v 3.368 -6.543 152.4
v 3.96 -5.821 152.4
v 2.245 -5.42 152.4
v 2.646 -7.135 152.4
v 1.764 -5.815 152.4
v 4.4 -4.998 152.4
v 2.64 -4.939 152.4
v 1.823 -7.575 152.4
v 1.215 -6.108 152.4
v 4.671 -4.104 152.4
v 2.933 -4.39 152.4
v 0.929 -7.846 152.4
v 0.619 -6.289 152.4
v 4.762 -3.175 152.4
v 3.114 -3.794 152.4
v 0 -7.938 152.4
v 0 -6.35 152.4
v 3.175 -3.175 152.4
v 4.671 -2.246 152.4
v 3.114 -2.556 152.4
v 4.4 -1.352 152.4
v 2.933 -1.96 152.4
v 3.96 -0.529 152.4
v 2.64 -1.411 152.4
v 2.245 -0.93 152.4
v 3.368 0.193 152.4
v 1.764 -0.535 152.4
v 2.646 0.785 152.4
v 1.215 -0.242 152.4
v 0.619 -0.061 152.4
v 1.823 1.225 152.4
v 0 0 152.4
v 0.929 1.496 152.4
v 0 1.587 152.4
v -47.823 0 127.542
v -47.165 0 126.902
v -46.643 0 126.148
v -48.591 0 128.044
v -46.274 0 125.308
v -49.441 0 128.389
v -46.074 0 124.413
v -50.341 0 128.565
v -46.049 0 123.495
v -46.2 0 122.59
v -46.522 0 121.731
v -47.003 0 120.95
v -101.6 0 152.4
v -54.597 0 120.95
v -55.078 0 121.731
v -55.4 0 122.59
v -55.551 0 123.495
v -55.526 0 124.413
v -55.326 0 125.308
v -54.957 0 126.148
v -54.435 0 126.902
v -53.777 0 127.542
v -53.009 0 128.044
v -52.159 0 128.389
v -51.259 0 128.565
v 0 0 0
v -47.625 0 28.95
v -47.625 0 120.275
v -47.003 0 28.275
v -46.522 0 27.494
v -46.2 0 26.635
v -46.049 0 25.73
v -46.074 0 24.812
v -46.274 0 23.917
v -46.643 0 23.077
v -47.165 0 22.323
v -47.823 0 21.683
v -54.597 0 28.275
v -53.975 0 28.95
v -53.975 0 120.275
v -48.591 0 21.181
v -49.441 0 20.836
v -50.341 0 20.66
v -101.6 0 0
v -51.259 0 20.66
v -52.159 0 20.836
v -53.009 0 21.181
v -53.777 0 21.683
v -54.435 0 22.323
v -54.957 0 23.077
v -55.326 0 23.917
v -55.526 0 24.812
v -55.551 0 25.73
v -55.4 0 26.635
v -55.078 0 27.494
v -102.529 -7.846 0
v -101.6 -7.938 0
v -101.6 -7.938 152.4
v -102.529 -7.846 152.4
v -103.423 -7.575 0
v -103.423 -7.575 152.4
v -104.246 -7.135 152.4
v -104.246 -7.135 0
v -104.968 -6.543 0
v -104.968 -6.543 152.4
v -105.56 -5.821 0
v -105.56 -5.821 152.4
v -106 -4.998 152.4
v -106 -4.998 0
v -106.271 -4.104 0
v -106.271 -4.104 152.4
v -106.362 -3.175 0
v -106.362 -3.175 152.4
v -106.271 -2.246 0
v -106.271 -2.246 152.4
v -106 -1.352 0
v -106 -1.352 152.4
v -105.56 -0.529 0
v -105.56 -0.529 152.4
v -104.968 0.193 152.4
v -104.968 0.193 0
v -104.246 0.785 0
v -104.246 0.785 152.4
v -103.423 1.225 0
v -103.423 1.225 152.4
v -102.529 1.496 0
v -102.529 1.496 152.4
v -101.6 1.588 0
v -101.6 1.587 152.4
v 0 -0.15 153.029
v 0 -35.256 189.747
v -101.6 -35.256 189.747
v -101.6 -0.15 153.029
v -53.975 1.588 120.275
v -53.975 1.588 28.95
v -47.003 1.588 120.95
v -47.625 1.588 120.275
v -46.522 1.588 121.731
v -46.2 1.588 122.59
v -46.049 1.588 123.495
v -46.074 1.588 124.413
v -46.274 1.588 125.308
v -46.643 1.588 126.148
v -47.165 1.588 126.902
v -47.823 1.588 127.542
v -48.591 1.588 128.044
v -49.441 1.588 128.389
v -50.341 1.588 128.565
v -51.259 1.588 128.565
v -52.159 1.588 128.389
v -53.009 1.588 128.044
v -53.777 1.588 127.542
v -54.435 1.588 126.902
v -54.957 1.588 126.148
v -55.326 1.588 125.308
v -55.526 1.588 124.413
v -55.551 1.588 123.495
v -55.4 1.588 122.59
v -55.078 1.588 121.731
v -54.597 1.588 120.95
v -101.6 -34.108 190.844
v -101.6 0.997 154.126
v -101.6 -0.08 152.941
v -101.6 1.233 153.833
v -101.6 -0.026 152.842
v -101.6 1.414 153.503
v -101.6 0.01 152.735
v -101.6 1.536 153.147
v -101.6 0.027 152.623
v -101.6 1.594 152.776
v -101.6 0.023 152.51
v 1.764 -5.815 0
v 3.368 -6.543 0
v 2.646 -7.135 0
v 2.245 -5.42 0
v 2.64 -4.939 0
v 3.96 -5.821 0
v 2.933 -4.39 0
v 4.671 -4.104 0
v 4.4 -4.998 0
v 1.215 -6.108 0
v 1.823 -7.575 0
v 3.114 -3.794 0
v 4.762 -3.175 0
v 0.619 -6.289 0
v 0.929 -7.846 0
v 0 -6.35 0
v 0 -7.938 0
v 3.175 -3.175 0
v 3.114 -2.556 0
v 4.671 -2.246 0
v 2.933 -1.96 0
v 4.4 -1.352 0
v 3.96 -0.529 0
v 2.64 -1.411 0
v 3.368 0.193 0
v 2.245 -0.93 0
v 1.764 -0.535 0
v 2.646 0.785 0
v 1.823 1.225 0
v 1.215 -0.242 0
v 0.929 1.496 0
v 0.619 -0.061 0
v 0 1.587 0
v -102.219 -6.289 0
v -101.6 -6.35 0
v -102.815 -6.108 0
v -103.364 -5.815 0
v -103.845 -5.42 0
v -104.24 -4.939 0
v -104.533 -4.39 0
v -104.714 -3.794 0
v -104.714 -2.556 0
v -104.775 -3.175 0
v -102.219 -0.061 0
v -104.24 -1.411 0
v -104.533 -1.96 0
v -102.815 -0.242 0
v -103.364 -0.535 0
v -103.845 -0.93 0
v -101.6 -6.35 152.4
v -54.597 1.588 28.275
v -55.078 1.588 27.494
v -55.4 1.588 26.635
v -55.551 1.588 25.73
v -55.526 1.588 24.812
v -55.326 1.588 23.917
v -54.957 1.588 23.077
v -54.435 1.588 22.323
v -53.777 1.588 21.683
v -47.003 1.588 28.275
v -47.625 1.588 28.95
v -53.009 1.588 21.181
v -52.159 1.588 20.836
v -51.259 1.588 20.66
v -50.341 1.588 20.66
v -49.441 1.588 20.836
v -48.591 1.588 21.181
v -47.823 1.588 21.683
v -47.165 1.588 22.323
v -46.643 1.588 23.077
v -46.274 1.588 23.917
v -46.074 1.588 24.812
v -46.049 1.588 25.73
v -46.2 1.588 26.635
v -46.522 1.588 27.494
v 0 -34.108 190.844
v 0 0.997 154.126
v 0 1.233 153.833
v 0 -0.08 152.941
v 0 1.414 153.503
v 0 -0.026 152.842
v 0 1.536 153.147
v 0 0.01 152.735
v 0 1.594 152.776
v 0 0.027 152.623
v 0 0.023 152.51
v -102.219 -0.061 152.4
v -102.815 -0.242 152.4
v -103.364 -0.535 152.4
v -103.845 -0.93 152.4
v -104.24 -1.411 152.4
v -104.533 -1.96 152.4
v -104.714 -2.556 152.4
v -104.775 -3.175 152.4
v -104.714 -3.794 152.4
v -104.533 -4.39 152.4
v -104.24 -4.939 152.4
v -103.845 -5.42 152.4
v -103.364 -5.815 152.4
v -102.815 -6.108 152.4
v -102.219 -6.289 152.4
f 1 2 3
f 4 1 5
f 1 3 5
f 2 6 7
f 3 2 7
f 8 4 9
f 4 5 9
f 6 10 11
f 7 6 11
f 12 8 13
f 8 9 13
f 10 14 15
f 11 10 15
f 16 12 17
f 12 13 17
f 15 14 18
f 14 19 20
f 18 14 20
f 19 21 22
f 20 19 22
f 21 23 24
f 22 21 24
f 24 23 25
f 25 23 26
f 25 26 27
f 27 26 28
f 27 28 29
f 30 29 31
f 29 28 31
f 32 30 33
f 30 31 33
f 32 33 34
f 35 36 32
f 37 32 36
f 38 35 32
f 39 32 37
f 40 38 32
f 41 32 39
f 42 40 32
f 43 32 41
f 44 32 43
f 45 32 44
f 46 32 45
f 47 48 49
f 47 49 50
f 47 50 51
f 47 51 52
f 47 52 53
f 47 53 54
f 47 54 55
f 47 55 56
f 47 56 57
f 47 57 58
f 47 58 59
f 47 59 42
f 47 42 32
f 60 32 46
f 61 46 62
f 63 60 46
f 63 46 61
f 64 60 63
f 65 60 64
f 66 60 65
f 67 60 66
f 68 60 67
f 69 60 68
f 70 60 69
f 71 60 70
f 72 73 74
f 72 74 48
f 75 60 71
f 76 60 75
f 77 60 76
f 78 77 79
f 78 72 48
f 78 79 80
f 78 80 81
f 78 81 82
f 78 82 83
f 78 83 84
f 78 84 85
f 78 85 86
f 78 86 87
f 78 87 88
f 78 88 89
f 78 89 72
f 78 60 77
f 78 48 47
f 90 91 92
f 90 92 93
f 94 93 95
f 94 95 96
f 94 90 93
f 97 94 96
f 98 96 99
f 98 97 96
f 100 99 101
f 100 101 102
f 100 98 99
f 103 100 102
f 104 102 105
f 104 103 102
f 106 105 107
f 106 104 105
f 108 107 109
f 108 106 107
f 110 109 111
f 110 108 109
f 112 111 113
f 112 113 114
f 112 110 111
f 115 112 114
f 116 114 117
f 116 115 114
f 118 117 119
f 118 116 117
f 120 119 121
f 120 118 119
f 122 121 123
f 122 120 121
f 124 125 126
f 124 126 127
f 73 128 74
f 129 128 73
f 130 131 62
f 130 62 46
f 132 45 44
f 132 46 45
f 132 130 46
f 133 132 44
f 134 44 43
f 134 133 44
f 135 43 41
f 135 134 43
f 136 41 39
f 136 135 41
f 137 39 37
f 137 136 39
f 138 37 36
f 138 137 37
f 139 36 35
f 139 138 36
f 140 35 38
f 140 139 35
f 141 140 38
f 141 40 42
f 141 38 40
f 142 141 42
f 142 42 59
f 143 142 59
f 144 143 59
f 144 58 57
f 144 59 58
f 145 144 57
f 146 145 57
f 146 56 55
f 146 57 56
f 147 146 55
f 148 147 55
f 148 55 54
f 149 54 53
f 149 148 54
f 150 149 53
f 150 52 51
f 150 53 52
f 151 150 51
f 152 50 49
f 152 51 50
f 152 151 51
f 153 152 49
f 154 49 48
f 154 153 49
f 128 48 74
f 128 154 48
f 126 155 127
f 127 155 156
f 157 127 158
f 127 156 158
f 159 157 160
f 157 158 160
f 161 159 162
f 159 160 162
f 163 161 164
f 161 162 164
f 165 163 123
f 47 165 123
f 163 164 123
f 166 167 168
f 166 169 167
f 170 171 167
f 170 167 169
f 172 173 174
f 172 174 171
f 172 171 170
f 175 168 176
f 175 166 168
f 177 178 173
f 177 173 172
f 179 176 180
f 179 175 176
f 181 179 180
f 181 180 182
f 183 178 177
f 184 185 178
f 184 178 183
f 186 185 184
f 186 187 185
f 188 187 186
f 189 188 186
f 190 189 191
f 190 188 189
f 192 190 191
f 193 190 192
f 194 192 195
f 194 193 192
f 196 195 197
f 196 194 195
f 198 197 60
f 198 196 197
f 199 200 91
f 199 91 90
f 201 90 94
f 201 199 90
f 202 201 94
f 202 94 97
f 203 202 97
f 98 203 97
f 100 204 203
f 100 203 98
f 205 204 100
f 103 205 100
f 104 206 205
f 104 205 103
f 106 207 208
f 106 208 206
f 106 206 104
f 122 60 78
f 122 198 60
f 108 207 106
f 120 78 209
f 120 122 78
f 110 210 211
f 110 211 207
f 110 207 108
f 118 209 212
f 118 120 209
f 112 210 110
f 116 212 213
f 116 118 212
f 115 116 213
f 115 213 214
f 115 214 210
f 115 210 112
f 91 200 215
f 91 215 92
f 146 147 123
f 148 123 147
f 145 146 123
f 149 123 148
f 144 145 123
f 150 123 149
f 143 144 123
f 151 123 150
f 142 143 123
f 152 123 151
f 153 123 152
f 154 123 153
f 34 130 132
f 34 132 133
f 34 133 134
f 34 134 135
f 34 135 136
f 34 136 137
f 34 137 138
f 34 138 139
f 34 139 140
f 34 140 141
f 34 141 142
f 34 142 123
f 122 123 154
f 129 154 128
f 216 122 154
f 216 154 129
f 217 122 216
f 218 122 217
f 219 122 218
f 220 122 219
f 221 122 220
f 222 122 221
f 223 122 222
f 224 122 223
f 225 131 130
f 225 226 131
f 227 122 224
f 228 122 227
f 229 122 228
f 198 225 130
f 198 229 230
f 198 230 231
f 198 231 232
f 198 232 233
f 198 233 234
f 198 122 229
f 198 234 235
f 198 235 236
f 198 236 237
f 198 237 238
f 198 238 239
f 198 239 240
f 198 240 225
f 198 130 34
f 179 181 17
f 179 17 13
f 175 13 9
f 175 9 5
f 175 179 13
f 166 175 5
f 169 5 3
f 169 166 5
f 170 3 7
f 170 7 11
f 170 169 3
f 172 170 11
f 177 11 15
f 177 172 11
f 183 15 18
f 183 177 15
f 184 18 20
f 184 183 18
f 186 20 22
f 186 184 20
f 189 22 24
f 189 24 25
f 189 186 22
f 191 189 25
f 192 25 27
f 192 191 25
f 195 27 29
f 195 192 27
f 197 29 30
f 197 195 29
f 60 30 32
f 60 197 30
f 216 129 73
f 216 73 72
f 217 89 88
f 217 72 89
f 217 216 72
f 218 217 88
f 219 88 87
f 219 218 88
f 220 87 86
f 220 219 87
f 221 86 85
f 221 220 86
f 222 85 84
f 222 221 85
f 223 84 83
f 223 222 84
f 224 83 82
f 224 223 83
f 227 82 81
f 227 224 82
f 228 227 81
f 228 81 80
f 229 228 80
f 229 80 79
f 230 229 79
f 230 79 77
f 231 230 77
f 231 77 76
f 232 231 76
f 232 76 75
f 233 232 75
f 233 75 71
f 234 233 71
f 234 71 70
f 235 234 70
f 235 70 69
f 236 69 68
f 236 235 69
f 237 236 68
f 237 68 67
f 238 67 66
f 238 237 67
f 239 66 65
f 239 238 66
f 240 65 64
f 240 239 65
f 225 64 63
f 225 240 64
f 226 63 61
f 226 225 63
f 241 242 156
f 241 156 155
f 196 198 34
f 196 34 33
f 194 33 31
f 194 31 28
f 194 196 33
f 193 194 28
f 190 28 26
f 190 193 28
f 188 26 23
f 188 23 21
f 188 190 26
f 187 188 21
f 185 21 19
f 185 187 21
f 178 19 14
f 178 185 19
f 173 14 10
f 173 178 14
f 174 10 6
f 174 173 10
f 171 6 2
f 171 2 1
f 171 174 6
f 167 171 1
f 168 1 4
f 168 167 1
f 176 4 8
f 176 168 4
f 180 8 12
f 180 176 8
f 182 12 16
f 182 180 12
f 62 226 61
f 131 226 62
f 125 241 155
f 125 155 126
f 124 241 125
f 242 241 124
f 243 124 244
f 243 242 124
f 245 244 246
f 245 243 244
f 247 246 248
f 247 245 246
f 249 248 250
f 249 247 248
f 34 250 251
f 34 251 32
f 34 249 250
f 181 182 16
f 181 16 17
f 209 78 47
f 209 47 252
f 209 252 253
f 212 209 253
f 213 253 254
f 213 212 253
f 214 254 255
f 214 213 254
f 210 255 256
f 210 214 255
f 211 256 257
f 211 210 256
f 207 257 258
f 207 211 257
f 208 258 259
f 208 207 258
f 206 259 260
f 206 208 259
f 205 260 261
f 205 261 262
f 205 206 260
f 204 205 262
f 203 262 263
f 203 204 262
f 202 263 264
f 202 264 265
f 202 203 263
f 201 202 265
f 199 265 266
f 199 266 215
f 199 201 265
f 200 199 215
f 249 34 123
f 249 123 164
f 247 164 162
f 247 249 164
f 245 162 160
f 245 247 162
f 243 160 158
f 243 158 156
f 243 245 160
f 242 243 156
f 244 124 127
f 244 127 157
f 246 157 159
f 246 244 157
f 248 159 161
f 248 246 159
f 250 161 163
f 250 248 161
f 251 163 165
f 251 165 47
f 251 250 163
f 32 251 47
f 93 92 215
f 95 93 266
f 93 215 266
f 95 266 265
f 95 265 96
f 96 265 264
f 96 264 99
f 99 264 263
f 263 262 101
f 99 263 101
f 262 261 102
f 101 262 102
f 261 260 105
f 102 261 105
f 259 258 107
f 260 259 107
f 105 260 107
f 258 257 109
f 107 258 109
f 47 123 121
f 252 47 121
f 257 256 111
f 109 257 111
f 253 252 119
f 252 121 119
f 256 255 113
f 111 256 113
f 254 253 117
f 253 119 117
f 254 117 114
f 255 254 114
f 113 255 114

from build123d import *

# Parameters (mm, degrees)
EXTRUDE_THIN1_DEPTH = 152.4
CUT_EXTRUDE1_DEPTH  = 187.089943391
BOSS_EXTRUDE1_DEPTH = 101.6


with BuildPart() as part:
    # Sketch1 → Extrude-Thin1 (new body)
    with BuildSketch(Plane.XY):
        with BuildLine():
            ThreePointArc((0, -6.35), (3.175, -3.175), (0, 0))
            Line((0, 0), (-101.6, 0))
            ThreePointArc((-101.6, 0), (-104.775, -3.175), (-101.6, -6.35))
            Line((-101.6, -6.35), (-101.6, -7.9375))
            ThreePointArc((-101.6, -7.9375), (-106.3625, -3.175), (-101.6, 1.5875))
            Line((-101.6, 1.5875), (0, 1.5875))
            ThreePointArc((0, 1.5875), (4.7625, -3.175), (0, -7.9375))
            Line((0, -7.9375), (0, -6.35))
        make_face()
    extrude(amount=EXTRUDE_THIN1_DEPTH)

    # Sketch3 → Cut-Extrude1 (cut, through all)
    with BuildSketch(Plane(origin=(0, 1.5875, 0), x_dir=(1, 0, 0), z_dir=(0, 1, 0))):
        with BuildLine():
            Line((-53.975, -120.275242086), (-53.975, -28.949757914))
            ThreePointArc((-53.975, -28.949757914), (-50.8, -20.6375), (-47.625, -28.949757914))
            Line((-47.625, -28.949757914), (-47.625, -120.275242086))
            ThreePointArc((-47.625, -120.275242086), (-50.8, -128.5875), (-53.975, -120.275242086))
        make_face()
    extrude(amount=-CUT_EXTRUDE1_DEPTH, mode=Mode.SUBTRACT)

    # Sketch4 → Boss-Extrude1 (add)
    with BuildSketch(Plane(origin=(0, 0, 0), x_dir=(0, 0, -1), z_dir=(1, 0, 0))):
        with BuildLine():
            Line((-154.126058809, 0.997401867), (-190.844208608, -34.108402144))
            Line((-190.844208608, -34.108402144), (-189.747152233, -35.255844326))
            Line((-189.747152233, -35.255844326), (-153.029002434, -0.150040314))
            ThreePointArc((-153.029002434, -0.150040314), (-152.734811746, 0.010126107), (-152.4, 0))
            Line((-152.4, 0), (-152.4, 1.5875))
            ThreePointArc((-152.4, 1.5875), (-153.32800726, 1.482513557), (-154.126058809, 0.997401867))
        make_face()
    extrude(amount=-BOSS_EXTRUDE1_DEPTH)


solid = part.part
